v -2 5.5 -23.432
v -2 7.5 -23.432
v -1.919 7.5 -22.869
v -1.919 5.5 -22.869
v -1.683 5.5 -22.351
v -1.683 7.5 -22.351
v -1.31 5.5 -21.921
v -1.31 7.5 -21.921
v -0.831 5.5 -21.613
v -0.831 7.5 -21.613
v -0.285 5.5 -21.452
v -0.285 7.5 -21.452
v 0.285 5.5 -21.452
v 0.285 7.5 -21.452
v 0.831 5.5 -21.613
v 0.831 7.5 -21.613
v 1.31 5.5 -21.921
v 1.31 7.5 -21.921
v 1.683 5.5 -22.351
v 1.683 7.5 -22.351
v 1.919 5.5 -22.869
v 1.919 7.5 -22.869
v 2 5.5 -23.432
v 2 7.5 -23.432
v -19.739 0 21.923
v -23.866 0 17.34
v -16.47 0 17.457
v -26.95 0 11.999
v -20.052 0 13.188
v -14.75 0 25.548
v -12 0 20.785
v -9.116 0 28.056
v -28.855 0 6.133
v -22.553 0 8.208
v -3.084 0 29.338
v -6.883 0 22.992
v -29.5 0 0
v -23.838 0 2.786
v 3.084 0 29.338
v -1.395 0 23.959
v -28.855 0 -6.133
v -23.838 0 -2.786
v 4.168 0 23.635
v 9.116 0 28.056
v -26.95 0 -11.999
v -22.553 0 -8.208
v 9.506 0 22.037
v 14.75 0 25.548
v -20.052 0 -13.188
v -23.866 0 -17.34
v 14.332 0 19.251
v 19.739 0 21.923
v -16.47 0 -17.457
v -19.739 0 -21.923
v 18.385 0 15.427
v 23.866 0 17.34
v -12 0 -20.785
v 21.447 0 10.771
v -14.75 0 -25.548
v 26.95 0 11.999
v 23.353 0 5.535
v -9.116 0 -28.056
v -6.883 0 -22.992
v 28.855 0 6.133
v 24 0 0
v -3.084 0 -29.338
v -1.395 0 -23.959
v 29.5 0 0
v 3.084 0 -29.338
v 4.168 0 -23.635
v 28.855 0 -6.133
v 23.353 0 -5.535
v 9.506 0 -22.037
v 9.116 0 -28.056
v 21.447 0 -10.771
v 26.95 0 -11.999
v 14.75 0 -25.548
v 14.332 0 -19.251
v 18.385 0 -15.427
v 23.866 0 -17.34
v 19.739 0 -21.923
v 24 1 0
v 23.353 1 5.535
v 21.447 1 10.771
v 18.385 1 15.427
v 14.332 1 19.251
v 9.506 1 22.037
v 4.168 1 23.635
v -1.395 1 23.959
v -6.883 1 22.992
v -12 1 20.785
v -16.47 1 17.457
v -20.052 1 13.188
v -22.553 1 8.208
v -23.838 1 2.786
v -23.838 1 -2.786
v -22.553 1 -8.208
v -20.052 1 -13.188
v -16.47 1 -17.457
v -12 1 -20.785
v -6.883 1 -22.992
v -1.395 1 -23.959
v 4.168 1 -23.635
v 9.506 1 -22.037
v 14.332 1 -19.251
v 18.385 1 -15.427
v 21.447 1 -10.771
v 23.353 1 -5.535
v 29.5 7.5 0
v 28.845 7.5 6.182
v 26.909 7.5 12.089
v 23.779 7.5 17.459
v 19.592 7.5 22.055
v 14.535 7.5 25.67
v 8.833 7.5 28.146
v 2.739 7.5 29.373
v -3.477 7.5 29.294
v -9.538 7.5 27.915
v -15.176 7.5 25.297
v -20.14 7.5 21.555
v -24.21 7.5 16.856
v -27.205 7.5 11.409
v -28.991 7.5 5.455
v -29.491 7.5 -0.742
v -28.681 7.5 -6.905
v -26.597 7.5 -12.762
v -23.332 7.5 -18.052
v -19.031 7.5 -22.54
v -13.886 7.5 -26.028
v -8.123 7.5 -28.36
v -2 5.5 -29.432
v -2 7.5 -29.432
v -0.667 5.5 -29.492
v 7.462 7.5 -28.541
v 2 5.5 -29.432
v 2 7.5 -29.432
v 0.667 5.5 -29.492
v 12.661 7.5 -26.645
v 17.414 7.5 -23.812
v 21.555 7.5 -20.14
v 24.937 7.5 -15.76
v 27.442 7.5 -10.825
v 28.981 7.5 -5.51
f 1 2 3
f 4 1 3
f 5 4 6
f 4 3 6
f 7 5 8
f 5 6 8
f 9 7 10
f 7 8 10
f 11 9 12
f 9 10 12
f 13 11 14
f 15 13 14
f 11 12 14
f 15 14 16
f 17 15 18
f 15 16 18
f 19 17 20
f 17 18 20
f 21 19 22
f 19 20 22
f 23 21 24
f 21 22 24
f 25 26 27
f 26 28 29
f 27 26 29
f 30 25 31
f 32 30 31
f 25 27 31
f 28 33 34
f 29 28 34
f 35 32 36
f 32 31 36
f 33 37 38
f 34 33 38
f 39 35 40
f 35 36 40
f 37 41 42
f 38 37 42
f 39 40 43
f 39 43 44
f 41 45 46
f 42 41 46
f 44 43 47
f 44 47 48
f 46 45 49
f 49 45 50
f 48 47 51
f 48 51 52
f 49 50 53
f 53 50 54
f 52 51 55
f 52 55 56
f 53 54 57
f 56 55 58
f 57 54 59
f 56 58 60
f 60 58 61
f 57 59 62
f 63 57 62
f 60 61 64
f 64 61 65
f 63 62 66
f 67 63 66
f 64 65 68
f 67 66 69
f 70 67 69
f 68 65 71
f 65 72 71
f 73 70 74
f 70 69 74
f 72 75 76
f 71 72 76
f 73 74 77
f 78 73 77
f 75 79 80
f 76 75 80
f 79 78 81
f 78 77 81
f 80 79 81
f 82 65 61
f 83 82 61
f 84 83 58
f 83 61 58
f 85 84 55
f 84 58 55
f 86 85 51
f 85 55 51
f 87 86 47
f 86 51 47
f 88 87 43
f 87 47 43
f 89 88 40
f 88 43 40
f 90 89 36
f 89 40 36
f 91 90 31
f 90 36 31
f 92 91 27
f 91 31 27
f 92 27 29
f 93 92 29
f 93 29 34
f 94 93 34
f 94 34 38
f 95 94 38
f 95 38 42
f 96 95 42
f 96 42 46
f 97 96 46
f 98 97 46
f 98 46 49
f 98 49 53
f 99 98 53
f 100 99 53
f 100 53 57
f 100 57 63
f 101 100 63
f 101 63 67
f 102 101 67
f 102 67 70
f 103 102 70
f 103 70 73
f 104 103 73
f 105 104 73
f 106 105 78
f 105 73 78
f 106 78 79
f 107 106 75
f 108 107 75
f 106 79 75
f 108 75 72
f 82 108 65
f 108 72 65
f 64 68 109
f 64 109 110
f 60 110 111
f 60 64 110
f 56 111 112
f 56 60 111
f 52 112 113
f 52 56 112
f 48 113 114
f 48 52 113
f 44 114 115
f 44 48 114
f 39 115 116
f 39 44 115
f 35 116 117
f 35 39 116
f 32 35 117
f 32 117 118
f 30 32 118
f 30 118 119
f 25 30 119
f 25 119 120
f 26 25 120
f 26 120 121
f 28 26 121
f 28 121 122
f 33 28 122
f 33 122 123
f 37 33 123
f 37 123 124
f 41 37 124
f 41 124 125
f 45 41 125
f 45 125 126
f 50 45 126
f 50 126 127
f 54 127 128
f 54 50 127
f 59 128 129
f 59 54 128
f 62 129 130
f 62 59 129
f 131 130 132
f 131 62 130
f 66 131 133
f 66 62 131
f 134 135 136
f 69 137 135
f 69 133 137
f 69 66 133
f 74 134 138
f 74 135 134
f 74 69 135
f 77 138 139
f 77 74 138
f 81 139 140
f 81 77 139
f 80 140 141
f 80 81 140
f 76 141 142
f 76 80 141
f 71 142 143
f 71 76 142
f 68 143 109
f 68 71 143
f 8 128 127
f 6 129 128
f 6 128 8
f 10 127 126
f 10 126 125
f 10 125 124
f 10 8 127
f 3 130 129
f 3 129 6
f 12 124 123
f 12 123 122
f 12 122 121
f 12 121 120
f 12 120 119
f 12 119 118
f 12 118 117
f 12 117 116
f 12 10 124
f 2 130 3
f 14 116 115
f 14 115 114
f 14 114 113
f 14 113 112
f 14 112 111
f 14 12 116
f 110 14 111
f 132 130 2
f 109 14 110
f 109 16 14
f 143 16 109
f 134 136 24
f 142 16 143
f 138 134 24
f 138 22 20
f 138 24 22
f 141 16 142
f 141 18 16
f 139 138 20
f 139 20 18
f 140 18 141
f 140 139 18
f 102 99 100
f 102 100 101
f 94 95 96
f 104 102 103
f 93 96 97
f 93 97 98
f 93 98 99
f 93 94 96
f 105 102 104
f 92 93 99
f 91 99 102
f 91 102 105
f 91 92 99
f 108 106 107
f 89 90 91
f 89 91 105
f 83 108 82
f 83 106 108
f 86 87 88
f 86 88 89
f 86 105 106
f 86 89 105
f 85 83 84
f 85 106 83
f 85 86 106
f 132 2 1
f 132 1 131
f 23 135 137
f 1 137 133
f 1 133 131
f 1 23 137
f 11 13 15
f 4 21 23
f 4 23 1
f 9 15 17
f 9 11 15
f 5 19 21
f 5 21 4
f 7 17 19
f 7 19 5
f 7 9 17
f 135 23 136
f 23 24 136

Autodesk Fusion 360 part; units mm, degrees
sketch "草图1" plane through (0, 0, 0) normal (0, 1, 0) x (1, 0, 0)
  circle A0 centre (0, 0) radius 29.5
  line L0 (0, 0) -> (0, 29.5) construction
  dimension "d1" = 59
extrude "拉伸1" add sketch "草图1" along normal blind 7.5
sketch "草图2" plane through (0, 0, 0) normal (0, -1, 0) x (1, 0, 0)
  circle A0 centre (0, 0) radius 29.5
  circle A1 centre (0, 0) radius 24
  dimension "d5" = 48
  dimension "d6" = 48
extrude "拉伸2" cut sketch "草图2" against normal blind 1 contours A1
sketch "草图3" plane through (0, 7.5, 0) normal (0, 1, 0) x (-1, 0, 0)
  circle A0 centre (0, 0) radius 29.5
  line L0 (-2, -23.4321) -> (-2, -29.4321)
  line L1 (2, -23.4321) -> (2, -29.4321)
  line L2 (0, 0) -> (0, -21.4321) construction
  arc A1 (2, -23.4321) -> (-2, -23.4321) centre (0, -23.4321) ccw
  dimension "d9" = 6
  dimension "d10" = 2
  dimension "d11" = 6
  dimension "d12" = 2
  dimension "d13" = 2
extrude "拉伸3" cut sketch "草图3" against normal blind 2 contours A0 L0 L1 A1 picked at (0.2224, -25.4522)
